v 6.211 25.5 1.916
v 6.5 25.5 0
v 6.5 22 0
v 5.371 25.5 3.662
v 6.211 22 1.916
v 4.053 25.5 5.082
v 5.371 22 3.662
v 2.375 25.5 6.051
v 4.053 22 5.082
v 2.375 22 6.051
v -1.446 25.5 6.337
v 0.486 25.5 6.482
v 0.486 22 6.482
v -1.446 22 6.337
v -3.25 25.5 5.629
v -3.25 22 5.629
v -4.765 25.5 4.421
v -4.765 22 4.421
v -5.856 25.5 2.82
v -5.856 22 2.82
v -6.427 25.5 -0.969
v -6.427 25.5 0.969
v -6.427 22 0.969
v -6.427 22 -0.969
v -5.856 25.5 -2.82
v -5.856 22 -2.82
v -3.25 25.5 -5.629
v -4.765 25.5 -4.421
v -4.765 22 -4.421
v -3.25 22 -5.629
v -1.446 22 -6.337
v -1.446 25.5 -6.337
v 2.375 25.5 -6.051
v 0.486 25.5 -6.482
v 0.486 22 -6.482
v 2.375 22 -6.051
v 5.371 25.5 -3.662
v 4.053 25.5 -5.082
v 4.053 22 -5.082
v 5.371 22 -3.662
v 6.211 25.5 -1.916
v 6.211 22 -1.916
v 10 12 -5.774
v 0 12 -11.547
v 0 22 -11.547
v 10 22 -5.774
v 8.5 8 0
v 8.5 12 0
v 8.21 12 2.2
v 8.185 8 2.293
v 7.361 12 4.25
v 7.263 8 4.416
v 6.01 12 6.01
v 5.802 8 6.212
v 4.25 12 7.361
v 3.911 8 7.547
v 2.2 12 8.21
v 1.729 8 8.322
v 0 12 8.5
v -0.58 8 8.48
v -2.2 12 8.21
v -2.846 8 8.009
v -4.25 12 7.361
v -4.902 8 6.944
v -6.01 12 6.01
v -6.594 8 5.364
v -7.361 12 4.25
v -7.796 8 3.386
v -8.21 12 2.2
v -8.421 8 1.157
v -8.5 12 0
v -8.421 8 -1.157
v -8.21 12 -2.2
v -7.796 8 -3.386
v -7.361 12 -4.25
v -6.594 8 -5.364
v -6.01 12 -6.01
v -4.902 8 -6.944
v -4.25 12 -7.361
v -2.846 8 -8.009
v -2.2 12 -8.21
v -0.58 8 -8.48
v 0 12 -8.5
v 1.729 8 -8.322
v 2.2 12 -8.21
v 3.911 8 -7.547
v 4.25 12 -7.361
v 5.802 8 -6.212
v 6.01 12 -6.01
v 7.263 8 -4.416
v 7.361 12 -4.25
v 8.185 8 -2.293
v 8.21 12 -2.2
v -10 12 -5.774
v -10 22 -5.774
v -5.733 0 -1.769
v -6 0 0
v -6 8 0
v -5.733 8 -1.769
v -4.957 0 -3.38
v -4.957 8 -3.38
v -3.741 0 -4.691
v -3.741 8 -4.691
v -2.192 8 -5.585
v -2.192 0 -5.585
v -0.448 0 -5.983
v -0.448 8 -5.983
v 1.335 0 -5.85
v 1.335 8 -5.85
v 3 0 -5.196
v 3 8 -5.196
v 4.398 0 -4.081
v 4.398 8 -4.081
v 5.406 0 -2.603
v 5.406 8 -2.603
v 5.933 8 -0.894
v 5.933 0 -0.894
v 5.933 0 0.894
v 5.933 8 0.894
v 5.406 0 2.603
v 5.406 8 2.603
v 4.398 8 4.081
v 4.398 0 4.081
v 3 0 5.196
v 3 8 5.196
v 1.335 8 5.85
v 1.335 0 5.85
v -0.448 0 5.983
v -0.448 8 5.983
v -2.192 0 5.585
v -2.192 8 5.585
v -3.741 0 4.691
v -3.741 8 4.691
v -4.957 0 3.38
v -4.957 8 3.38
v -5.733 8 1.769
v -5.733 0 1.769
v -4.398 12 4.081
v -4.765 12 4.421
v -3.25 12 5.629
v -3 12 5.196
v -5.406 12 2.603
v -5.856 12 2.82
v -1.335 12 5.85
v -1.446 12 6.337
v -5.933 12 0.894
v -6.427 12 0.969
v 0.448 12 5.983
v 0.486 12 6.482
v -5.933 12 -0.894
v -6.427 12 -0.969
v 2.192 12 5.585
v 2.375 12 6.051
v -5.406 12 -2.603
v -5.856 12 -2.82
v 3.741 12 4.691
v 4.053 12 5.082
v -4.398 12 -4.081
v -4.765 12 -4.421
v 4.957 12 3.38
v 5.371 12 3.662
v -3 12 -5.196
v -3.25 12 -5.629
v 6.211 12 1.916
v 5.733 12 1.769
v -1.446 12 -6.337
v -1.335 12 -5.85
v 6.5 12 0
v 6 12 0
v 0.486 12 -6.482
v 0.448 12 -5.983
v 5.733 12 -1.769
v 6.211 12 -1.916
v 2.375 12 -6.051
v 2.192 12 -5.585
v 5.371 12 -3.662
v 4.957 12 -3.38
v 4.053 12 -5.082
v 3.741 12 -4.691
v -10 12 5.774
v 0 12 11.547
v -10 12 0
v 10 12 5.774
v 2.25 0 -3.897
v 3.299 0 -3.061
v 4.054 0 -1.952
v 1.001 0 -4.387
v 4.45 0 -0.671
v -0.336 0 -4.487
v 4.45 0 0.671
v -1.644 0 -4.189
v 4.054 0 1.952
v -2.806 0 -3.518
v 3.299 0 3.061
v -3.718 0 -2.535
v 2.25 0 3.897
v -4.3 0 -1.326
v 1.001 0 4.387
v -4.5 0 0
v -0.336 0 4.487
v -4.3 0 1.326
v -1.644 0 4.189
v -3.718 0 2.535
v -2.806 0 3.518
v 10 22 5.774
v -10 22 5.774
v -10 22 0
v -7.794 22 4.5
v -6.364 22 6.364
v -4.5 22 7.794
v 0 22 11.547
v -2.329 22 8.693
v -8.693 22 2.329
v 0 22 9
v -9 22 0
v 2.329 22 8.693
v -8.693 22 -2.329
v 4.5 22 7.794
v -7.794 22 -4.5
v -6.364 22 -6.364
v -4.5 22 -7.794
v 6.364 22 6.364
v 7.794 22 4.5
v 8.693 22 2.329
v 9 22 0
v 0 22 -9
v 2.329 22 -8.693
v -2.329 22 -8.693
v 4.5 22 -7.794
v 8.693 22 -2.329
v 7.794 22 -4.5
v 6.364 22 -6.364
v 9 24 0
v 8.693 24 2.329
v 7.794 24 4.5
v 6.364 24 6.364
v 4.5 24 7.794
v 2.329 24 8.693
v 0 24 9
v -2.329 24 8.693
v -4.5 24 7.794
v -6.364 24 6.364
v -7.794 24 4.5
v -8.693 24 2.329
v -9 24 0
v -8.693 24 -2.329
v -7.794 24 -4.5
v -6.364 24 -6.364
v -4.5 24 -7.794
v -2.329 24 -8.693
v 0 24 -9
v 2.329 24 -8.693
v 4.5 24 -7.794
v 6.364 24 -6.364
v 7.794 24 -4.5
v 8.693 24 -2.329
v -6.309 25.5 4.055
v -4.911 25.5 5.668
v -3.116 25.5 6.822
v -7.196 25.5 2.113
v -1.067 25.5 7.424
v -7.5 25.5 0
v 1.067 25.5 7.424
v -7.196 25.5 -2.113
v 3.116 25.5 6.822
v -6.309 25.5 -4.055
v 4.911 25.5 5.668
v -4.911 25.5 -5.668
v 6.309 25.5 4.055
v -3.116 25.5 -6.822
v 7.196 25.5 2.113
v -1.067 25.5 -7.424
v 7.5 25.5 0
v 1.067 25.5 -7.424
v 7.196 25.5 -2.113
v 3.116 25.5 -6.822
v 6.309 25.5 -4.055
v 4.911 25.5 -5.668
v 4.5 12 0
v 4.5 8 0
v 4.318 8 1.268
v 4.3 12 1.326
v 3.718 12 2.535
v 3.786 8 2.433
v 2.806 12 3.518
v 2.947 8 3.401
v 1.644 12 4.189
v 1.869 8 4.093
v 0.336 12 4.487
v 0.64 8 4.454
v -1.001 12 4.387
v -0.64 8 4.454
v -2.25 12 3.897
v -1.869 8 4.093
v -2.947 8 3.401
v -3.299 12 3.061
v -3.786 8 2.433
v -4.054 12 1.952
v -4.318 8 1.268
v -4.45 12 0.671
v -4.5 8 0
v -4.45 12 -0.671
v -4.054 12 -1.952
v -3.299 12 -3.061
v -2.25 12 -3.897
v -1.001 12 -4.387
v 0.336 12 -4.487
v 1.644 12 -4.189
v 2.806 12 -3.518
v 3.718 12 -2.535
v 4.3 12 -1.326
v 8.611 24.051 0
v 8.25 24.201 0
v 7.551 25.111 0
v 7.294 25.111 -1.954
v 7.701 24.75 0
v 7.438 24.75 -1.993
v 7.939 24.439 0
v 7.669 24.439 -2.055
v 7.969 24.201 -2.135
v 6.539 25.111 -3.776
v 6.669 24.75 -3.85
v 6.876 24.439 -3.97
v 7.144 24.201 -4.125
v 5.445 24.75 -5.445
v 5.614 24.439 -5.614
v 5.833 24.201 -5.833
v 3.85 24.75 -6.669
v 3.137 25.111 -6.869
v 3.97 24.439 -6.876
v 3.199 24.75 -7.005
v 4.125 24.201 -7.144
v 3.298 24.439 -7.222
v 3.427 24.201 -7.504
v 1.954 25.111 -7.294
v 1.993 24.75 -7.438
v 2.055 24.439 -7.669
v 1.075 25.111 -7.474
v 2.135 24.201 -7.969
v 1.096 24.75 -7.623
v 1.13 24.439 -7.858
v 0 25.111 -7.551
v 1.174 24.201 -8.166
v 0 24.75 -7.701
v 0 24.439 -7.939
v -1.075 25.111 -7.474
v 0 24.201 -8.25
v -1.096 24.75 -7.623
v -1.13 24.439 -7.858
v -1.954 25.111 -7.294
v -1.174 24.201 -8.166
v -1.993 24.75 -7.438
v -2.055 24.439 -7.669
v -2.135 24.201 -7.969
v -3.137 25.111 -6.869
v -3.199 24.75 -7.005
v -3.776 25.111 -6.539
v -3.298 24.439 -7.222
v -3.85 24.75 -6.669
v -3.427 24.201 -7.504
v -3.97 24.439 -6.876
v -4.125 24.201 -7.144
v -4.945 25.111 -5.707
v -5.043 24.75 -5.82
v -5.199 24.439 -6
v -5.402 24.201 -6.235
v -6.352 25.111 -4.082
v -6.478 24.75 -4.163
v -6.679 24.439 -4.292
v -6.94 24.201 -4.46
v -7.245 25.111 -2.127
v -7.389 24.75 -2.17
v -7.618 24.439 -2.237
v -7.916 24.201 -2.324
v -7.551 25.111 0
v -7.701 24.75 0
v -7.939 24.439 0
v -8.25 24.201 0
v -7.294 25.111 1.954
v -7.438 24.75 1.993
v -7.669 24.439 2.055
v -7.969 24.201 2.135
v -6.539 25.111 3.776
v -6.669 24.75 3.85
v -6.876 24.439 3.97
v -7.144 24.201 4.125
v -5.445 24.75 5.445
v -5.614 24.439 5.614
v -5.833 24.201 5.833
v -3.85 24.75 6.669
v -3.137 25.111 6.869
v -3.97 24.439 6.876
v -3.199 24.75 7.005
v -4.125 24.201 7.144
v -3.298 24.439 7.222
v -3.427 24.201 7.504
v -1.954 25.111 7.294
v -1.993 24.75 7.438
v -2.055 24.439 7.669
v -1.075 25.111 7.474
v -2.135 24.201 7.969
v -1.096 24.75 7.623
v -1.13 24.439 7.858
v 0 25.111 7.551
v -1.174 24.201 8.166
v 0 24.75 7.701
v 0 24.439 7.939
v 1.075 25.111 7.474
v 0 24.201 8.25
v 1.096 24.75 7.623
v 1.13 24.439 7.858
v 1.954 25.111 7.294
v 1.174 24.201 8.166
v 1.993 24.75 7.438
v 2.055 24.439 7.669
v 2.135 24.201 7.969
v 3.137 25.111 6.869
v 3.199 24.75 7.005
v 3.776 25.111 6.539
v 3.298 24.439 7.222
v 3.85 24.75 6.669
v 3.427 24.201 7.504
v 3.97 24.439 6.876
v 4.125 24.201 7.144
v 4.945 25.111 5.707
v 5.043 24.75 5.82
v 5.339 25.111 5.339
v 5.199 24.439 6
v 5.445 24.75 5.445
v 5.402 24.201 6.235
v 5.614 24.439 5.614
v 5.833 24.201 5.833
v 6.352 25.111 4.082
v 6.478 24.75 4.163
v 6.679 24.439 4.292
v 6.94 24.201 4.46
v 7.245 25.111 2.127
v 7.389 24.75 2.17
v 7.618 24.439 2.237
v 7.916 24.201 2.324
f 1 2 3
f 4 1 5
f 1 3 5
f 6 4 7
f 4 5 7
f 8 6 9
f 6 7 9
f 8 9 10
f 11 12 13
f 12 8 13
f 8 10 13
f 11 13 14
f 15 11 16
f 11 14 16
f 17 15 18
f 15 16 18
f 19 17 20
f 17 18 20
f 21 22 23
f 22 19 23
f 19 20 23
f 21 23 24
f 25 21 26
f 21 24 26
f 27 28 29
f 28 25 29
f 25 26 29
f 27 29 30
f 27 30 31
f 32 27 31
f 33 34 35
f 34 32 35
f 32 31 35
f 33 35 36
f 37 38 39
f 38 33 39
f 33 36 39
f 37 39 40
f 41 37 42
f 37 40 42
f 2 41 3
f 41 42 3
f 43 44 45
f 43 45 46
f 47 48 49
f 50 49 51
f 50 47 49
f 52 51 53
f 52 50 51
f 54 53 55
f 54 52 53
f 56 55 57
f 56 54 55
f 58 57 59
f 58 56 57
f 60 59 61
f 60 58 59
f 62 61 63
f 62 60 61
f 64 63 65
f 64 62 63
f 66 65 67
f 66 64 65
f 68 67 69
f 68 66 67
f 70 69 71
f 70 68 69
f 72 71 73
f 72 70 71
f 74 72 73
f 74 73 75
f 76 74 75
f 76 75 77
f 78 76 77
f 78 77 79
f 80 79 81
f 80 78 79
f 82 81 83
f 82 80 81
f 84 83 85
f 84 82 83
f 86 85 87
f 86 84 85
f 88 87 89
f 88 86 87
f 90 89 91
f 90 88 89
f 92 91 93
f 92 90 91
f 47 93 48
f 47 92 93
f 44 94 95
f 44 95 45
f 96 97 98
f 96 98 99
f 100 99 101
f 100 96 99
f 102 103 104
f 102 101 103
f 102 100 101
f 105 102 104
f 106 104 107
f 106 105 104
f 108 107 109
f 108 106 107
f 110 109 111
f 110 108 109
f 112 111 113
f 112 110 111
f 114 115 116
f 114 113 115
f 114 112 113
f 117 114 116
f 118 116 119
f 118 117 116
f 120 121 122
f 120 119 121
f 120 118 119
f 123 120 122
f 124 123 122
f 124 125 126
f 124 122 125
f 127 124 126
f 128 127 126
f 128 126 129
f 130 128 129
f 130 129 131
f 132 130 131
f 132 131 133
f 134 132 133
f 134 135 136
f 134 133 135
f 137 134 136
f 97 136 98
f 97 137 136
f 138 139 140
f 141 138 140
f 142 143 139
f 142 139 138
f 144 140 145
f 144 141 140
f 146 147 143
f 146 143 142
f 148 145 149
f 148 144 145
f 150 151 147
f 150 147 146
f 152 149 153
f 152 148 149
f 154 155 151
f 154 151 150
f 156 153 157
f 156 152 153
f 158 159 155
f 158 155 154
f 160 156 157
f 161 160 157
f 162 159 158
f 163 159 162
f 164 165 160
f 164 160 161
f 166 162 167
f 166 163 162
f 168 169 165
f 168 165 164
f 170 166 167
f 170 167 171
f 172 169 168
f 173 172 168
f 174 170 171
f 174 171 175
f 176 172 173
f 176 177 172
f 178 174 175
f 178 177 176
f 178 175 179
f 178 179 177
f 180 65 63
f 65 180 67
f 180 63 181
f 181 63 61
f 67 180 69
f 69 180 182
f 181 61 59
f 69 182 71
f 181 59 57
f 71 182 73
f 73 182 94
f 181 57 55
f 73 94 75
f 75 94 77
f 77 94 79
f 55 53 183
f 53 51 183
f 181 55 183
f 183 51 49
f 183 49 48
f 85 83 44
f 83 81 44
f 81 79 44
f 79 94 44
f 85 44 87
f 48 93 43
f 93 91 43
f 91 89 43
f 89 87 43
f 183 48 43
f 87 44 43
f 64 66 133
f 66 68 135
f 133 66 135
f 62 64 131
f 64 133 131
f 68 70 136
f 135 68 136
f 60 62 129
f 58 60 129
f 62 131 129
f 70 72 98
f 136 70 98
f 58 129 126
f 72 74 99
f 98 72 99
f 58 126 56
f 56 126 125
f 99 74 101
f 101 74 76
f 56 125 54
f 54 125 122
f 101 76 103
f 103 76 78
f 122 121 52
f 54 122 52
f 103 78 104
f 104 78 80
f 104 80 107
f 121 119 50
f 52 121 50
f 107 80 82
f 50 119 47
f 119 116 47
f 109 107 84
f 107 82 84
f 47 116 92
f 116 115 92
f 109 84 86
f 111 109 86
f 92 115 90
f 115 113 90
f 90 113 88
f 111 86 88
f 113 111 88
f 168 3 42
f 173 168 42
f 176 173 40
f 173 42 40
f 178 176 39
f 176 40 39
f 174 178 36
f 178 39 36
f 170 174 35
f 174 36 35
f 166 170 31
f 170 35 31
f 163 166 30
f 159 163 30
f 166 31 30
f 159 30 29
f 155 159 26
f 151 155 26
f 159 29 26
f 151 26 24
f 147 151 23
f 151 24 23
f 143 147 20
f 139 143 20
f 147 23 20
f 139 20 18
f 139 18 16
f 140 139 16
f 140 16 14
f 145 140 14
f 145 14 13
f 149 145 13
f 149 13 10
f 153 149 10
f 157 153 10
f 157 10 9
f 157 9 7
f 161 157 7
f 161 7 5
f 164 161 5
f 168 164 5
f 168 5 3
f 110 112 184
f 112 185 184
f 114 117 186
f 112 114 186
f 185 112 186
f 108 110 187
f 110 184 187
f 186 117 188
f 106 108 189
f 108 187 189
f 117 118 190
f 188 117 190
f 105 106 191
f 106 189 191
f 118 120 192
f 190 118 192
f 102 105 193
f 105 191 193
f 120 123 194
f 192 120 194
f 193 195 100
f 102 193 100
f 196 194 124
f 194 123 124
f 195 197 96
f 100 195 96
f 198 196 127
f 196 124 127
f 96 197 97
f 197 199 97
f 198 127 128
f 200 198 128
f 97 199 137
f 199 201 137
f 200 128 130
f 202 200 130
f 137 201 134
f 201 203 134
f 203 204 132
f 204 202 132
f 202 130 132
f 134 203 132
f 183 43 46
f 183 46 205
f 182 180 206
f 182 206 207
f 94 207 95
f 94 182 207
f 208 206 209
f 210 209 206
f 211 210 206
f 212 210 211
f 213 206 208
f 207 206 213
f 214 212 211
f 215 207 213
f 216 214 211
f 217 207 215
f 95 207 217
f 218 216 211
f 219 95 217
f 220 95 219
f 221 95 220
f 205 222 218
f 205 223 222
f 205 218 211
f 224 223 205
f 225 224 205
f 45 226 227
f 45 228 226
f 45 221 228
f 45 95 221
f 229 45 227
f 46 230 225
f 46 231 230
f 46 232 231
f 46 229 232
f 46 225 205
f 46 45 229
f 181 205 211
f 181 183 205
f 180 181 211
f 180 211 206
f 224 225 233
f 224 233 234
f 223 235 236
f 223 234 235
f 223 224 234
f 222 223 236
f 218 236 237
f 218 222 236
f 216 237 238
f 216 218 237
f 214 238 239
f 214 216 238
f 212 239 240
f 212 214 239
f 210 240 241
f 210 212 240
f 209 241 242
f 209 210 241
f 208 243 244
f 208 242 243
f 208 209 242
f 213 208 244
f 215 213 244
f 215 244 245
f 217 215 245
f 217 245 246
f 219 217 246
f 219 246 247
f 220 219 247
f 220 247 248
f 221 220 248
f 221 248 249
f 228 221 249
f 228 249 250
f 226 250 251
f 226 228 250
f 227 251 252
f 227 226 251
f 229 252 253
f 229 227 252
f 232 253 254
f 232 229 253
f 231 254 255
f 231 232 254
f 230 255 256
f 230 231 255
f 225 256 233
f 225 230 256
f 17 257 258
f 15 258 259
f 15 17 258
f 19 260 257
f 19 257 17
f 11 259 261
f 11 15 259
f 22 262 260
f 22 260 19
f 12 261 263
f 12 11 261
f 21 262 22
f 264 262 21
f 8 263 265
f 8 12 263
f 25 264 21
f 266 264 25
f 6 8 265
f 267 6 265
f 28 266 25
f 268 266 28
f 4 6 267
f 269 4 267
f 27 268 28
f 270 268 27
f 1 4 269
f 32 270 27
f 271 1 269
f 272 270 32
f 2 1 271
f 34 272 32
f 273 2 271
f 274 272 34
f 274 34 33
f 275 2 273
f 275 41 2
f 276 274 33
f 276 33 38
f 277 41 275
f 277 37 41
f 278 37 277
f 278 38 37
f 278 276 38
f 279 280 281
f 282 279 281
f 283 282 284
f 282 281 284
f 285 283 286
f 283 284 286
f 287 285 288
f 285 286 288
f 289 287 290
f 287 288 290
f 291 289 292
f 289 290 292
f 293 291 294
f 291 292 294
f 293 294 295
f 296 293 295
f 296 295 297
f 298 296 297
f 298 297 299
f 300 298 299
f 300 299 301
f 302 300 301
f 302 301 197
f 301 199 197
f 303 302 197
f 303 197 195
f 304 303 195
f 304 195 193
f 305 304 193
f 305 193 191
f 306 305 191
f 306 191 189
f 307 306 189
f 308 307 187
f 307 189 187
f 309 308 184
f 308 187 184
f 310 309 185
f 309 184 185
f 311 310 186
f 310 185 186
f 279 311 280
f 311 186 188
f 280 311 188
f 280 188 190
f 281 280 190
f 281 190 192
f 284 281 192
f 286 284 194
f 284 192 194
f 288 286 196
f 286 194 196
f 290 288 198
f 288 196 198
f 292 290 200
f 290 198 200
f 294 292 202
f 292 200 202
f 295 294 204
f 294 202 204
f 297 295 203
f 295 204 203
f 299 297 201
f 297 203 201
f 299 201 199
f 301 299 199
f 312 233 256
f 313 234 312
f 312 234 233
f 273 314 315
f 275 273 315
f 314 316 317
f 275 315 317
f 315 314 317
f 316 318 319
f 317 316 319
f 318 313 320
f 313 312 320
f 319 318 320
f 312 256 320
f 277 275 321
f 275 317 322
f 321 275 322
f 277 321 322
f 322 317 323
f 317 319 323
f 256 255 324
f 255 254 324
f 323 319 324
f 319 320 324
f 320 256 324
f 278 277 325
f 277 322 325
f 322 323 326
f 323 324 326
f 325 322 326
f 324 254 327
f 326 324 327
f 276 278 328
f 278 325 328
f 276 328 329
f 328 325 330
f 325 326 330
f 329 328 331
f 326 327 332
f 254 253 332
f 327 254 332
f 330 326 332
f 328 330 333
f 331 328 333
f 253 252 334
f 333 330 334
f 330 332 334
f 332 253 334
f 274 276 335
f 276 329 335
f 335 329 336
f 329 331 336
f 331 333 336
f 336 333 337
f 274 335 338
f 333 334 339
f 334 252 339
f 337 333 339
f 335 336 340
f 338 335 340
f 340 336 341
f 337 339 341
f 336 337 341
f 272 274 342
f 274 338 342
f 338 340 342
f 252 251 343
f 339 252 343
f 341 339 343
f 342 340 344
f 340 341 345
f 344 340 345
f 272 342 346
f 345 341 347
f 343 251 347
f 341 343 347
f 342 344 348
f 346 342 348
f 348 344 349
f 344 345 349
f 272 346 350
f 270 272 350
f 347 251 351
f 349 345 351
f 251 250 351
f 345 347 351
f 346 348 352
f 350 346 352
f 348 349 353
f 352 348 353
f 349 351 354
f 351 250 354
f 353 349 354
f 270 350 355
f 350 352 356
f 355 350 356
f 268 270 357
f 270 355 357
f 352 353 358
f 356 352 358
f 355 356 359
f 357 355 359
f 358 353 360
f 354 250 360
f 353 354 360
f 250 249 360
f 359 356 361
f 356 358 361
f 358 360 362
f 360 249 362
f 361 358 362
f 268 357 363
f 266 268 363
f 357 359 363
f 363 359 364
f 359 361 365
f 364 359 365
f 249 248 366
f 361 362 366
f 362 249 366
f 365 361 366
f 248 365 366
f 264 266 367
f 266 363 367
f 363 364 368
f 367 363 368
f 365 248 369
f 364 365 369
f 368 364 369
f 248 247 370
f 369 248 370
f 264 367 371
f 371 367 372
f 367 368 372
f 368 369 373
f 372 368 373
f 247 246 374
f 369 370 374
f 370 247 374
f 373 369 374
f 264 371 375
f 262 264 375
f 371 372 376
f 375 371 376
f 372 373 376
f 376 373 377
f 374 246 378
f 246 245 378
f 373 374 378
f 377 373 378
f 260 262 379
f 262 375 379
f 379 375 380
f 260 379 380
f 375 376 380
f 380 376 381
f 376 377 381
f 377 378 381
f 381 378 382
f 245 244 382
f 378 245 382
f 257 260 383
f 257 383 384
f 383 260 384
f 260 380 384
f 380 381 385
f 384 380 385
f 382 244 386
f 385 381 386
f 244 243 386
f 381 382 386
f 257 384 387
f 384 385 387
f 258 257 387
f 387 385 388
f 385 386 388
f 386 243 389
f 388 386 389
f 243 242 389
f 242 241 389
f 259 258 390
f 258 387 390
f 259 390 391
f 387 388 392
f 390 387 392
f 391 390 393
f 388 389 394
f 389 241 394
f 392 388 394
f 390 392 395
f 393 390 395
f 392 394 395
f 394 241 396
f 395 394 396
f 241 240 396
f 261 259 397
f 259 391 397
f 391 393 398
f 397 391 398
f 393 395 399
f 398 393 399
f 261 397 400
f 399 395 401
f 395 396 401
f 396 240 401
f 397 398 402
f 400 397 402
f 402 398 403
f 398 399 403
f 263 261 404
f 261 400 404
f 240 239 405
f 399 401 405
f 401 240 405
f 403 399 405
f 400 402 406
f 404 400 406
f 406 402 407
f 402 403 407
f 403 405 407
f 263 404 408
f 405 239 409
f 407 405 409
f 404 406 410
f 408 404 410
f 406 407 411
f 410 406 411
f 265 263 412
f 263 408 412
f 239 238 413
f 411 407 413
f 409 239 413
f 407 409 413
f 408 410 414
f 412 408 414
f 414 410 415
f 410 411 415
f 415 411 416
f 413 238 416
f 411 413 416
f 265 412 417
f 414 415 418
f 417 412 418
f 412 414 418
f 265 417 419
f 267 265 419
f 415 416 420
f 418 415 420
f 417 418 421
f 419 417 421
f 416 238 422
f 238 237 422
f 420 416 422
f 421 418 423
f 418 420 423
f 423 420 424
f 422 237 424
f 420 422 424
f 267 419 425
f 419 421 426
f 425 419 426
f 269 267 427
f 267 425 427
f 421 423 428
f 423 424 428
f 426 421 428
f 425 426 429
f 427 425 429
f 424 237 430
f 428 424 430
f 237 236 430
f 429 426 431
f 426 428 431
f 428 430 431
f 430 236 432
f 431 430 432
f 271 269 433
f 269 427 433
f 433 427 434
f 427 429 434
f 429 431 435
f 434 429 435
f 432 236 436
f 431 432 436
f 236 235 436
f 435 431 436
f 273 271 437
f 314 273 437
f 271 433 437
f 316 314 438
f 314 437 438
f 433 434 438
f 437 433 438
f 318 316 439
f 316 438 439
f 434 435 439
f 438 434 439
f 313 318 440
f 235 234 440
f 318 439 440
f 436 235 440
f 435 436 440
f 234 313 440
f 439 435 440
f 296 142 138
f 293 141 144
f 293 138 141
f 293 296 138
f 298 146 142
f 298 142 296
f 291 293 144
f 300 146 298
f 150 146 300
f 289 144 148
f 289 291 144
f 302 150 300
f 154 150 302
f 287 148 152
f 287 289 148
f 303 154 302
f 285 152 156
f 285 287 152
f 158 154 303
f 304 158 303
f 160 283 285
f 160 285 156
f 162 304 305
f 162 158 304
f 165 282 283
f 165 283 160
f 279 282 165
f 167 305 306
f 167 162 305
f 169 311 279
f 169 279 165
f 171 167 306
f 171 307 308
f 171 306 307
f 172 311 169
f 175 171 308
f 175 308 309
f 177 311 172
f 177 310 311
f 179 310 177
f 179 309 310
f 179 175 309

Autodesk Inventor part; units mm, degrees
ref_plane "YZ Plane" through (0, 0, 0) normal (1, 0, 0) x (0, 1, 0)
ref_plane "XZ Plane" through (0, 0, 0) normal (0, 1, 0) x (-1, 0, 0)
ref_plane "XY Plane" through (0, 0, 0) normal (0, 0, 1) x (1, 0, 0)
sketch "Sketch1" plane through (0, 0, 0) normal (0, 1, 0) x (-1, 0, 0)
  circle A0 centre (0, 0) radius 6
  circle A1 centre (0, 0) radius 4.5
  dimension "d2" = 12
  dimension "d3" = 9
extrude "Extrusion1" add sketch "Sketch1" along normal blind 8
sketch "Sketch2" plane through (0, 8, 0) normal (0, 1, 0) x (1, 0, 0)
  circle A0 centre (0, 0) radius 8.5
  circle A1 centre (0, 0) radius 4.5 projected
  dimension "d6" = 17
extrude "Extrusion2" add sketch "Sketch2" along normal blind 4
sketch "Sketch3" plane through (0, 12, 0) normal (0, 1, 0) x (1, 0, 0)
  line L0 (0, 0) -> (-10, 0)
  line L1 (-10, 5.7735) -> (0, 11.547)
  line L2 (0, 11.547) -> (10, 5.7735)
  line L3 (10, 5.7735) -> (10, -5.7735)
  line L4 (10, -5.7735) -> (0, -11.547)
  line L5 (0, -11.547) -> (-10, -5.7735)
  line L6 (-10, -5.7735) -> (-10, 5.7735)
  circle A0 centre (0, 0) radius 6 projected
  dimension "d9" = 10
extrude "Extrusion3" add sketch "Sketch3" along normal blind 10
sketch "Sketch4" plane through (0, 22, 0) normal (0, 1, 0) x (1, 0, 0)
  circle A0 centre (0, 0) radius 9
  circle A1 centre (0, 0) radius 6.5
  dimension "d12" = 18
  dimension "d13" = 13
extrude "Extrusion4" add sketch "Sketch4" along normal blind 2
sketch "Sketch5" plane through (0, 24, 0) normal (0, 1, 0) x (1, 0, 0)
  circle A0 centre (0, 0) radius 6.5
  circle A1 centre (0, 0) radius 6.5 projected
  circle A2 centre (0, 0) radius 7.5
  dimension "d16" = 15
extrude "Extrusion5" add sketch "Sketch5" along normal blind 1.5
fillet "Fillet1" radius 1.5 1 edges at (-7.5, 24, 0)
sketch "Sketch6" plane through (0, 25.5, 0) normal (0, 1, 0) x (1, 0, 0)
  circle A0 centre (0, 0) radius 7.5 projected
  circle A1 centre (0, 0) radius 6.5
extrude "Extrusion6" cut sketch "Sketch6" against normal blind 13.5 contours A1
thread "Thread1" size "M12x1.75" class "6g" standard "ANSI Metric M Profile" full length
sketch "Sketch7" plane through (0, 25.5, 0) normal (0, 1, 0) x (1, 0, 0)
  circle A0 centre (0, 0) radius 6.5 projected
properties part number "entrada_manguera_alicat_flujo"
